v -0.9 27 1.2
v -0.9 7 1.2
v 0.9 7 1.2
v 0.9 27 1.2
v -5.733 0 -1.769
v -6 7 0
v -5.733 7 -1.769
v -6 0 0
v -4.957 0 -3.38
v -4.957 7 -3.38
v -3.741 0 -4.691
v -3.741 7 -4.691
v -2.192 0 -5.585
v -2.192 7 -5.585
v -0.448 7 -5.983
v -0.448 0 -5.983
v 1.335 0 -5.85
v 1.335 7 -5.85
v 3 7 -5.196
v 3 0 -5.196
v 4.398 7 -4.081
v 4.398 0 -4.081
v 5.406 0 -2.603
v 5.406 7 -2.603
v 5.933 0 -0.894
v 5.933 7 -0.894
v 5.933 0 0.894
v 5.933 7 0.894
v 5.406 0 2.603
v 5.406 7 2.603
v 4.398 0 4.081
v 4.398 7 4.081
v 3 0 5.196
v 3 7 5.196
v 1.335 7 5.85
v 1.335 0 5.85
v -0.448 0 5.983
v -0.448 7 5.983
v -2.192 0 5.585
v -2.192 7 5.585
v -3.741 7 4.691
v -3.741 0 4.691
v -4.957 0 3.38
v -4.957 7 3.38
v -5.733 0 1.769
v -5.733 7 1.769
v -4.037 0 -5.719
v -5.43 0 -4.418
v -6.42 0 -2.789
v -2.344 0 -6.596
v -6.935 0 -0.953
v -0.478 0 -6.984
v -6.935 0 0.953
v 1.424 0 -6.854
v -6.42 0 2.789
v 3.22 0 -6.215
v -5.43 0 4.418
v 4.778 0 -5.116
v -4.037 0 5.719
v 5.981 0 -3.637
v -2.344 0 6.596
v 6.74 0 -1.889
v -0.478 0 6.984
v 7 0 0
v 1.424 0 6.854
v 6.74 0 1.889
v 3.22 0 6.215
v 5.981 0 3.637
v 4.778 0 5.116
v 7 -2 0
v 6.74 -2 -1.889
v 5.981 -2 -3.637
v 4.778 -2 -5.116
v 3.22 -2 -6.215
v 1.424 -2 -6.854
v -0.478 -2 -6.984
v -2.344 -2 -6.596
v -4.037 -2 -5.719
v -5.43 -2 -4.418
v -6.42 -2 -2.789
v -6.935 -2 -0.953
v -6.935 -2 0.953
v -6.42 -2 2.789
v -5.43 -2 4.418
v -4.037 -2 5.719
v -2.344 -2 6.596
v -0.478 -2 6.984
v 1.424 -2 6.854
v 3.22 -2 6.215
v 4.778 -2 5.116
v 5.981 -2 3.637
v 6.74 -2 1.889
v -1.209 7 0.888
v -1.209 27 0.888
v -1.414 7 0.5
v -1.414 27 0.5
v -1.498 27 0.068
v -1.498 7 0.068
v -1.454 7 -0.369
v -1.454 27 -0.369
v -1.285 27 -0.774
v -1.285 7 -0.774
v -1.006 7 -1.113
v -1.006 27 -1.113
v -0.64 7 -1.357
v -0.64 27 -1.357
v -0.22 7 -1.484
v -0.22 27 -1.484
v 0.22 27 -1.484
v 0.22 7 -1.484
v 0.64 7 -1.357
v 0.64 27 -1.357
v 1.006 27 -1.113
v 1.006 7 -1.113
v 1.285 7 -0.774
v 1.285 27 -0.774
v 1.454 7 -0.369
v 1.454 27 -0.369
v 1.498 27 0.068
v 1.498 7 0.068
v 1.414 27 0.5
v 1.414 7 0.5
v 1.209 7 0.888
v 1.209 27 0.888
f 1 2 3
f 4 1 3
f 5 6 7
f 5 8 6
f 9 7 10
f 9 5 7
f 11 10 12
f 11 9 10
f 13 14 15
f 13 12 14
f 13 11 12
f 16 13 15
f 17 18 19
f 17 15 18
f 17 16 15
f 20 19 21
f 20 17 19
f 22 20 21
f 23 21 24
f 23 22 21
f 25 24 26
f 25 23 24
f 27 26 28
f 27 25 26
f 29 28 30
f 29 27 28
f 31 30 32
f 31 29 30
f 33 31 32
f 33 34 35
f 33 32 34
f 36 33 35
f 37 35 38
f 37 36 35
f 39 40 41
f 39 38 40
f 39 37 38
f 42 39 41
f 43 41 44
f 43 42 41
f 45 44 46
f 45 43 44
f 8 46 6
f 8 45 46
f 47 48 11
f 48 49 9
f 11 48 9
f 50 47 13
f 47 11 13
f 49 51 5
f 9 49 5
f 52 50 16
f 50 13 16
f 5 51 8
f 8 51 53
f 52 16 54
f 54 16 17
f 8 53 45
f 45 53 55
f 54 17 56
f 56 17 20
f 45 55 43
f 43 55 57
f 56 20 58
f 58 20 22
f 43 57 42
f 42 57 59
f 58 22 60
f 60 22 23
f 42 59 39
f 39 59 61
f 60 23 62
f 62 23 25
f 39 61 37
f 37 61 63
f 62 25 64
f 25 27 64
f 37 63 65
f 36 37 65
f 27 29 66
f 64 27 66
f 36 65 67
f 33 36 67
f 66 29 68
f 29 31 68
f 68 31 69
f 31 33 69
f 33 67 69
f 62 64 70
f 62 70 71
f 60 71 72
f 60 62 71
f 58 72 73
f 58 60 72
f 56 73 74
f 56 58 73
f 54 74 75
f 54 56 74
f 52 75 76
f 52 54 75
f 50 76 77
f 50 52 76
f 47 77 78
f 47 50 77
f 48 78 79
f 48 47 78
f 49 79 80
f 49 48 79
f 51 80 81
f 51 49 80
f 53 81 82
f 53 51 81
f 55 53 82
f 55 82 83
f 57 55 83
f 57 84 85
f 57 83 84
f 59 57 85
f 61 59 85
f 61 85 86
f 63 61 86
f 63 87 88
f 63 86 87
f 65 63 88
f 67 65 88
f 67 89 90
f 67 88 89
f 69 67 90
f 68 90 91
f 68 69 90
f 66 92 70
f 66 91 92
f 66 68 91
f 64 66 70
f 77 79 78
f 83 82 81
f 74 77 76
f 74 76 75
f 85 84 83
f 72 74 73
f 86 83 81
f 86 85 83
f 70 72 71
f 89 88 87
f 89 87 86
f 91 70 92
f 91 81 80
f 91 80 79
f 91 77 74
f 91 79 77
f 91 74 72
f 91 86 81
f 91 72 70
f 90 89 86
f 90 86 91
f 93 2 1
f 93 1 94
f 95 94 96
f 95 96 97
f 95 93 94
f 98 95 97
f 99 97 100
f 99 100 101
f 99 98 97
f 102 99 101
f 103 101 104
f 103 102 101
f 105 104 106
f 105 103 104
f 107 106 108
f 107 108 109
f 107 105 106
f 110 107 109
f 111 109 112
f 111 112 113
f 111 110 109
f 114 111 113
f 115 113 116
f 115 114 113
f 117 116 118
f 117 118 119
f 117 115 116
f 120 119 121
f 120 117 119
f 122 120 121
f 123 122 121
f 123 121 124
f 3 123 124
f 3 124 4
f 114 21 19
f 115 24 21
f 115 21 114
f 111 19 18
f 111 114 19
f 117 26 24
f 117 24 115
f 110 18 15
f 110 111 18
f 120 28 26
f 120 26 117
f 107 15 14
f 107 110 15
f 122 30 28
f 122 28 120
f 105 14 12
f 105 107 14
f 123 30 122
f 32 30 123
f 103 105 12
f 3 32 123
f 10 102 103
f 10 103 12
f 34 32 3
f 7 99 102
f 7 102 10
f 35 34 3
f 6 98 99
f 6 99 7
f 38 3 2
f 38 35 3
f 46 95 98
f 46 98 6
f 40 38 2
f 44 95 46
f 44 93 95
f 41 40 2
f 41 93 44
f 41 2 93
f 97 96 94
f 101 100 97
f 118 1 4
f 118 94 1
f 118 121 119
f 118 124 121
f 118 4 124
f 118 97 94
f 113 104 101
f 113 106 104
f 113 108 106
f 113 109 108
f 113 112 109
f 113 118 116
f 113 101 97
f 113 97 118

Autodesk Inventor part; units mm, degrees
ref_plane "YZ Plane" through (0, 0, 0) normal (1, 0, 0) x (0, 1, 0)
ref_plane "XZ Plane" through (0, 0, 0) normal (0, 1, 0) x (-1, 0, 0)
ref_plane "XY Plane" through (0, 0, 0) normal (0, 0, 1) x (1, 0, 0)
sketch "Sketch1" plane through (0, 0, 0) normal (0, 1, 0) x (-1, 0, 0)
  circle A0 centre (0, 0) radius 6
  dimension "d0" = 12
extrude "Extrusion1" add sketch "Sketch1" along normal blind 7
sketch "Sketch2" plane through (0, 7, 0) normal (0, 1, 0) x (1, 0, 0)
  circle A0 centre (0, 0) radius 1.5
  line L0 (-1.6953, -1.2) -> (1.8425, -1.2)
  point P0 (-0.9, -1.2)
  point P1 (0.9, -1.2)
  dimension "d3" = 3
  dimension "d5" = 2.7
extrude "Extrusion2" add sketch "Sketch2" along normal blind 20 contours A0 L0 picked at (0.3741, -0.3089)
sketch "Sketch3" plane through (0, 0, 0) normal (0, -1, 0) x (1, 0, 0)
  circle A0 centre (0, 0) radius 7
  dimension "d8" = 14
extrude "Extrusion3" add sketch "Sketch3" along normal blind 2
properties part number "spojkaRotoruSGondolou"
